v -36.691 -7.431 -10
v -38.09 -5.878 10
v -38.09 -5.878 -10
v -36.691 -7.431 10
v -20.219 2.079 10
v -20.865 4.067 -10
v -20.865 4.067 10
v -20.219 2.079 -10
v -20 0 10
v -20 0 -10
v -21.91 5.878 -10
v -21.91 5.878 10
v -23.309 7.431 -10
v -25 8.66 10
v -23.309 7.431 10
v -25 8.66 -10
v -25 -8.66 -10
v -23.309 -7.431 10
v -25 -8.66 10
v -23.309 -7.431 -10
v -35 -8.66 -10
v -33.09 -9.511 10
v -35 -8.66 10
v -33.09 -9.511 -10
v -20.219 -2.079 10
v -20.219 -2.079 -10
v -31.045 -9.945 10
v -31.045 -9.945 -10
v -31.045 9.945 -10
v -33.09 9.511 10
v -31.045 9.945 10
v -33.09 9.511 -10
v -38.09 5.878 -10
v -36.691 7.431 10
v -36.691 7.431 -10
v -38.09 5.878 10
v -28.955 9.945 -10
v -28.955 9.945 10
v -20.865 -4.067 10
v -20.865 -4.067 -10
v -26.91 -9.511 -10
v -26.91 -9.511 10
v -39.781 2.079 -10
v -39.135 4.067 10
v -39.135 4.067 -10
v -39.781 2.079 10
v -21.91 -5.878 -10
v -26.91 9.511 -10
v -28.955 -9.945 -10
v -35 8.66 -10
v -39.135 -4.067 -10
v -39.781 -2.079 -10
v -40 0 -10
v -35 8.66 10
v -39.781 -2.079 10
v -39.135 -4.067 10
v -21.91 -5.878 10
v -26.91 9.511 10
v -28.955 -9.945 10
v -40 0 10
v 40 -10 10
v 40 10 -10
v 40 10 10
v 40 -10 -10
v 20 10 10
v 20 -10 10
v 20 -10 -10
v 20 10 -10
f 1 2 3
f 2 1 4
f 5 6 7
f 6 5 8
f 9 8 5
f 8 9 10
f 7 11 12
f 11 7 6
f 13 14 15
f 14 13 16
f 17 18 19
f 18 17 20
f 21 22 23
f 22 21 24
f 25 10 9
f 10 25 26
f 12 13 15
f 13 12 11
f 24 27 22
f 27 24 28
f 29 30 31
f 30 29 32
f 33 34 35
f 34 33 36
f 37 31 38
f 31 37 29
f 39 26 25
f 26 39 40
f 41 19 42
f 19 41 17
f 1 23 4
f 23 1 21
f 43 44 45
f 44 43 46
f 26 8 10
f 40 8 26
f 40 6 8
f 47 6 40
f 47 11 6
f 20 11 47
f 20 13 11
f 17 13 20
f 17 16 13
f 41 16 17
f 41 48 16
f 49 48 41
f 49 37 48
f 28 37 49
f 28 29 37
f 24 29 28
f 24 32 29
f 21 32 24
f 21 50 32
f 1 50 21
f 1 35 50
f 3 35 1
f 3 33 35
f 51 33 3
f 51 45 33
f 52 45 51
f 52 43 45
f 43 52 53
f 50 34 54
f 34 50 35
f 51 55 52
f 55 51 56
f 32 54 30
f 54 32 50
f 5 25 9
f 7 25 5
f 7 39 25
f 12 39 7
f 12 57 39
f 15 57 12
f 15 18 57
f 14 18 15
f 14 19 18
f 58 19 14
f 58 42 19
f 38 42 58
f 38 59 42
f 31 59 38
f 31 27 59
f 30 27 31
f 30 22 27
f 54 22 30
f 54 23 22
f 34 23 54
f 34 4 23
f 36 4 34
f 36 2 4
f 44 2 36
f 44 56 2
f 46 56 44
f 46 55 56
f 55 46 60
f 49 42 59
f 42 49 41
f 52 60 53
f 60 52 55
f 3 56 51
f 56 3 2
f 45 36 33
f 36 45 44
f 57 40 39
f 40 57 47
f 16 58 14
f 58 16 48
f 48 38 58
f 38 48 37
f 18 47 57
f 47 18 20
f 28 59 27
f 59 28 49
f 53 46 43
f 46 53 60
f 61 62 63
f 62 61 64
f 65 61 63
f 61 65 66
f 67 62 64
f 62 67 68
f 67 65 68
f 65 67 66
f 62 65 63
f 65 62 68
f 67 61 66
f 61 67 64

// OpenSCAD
/* [Global] */
object=2; //[0:cube,1:cylinder,2:both]

/* [Dimensions] */
height=20; //[1:100]
width=20; //[1:100]

module drwCb() {
		translate([width*1.5, 0, 0]) cube([width, width, height], center=true);
}

module drwCyl () {
	translate([width*-1.5, 0, 0]) cylinder(r=width/2, h=height, center=true);
}

if (object==0) {
	drwCb();
} 

if (object==1) {
	drwCyl();
}

if (object==2) {
	drwCyl();
	drwCb();
}
